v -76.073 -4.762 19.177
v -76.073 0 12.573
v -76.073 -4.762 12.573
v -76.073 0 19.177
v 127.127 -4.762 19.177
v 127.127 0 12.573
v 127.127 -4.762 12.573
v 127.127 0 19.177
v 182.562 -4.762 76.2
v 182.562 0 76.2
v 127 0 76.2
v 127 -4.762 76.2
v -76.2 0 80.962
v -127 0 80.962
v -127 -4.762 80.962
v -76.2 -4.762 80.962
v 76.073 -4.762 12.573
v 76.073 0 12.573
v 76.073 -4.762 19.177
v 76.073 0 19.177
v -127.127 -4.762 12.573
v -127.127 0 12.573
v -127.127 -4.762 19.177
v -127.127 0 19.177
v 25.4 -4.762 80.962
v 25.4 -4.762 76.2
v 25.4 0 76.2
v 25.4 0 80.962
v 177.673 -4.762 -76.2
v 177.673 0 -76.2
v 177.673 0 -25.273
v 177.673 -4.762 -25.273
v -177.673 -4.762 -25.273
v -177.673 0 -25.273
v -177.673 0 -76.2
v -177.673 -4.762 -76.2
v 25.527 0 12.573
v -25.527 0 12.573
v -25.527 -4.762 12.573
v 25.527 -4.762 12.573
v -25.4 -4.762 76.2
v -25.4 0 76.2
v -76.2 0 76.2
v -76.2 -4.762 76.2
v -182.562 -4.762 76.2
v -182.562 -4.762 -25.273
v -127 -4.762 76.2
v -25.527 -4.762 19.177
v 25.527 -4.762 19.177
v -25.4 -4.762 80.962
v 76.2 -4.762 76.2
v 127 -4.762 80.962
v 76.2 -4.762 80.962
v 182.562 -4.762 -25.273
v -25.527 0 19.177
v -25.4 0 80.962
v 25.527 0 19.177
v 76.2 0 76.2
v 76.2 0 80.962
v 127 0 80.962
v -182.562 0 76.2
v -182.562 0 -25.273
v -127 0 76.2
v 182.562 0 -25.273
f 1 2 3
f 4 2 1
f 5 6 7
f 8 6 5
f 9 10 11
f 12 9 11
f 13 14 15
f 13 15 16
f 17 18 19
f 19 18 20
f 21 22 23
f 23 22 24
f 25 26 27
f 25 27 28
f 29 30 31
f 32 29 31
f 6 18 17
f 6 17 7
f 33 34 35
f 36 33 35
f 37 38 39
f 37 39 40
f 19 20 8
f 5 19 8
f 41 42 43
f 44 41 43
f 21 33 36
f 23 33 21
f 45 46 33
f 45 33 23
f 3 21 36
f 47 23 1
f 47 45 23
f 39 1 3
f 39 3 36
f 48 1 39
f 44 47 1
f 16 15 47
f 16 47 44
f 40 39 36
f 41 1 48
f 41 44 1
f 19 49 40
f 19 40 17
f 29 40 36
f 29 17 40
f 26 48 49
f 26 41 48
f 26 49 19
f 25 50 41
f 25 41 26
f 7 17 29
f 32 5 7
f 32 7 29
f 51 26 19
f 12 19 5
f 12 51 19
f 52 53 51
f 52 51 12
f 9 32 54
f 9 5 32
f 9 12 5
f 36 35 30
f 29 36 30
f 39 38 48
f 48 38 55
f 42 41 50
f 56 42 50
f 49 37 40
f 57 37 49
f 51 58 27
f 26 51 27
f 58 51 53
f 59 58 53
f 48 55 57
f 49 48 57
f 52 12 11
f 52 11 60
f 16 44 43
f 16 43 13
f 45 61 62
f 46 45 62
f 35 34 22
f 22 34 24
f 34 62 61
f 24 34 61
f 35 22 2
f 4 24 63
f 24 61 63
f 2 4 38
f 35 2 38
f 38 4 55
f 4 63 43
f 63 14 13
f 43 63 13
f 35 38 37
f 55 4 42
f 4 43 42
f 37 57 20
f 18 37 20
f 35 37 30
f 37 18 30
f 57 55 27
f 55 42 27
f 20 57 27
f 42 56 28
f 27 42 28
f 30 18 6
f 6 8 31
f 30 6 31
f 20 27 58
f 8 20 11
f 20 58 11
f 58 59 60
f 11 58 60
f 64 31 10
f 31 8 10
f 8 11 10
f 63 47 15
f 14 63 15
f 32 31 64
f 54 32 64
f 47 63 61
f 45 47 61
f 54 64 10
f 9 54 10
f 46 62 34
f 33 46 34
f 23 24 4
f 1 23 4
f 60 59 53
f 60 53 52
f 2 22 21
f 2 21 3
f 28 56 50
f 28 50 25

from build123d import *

# Parameters (mm, degrees)
F0_W     = 51.054
F0_H     = 6.604
F0_W_2   = 50.8
F0_H_2   = 4.7625
F1_DEPTH = 4.7625


with BuildPart() as f1:
    # F0 (on Front) → F1 (new body)
    with BuildSketch(Plane.XZ):
        Polygon((-127, 76.2), (-182.5625, 76.2), (-182.5625, -25.273), (-177.673, -25.273), (-177.673, -76.2), (177.673, -76.2), (177.673, -25.273), (182.5625, -25.273), (182.5625, 76.2), (127, 76.2), (76.2, 76.2), (25.4, 76.2), (-25.4, 76.2), (-76.2, 76.2), align=None)
        with Locations((-101.6, 15.875)):
            Rectangle(F0_W, F0_H, mode=Mode.SUBTRACT)
        with Locations((0, 15.875)):
            Rectangle(F0_W, F0_H, mode=Mode.SUBTRACT)
        with Locations((101.6, 15.875)):
            Rectangle(F0_W, F0_H, mode=Mode.SUBTRACT)
        with Locations((-101.6, 78.58125)):
            Rectangle(F0_W_2, F0_H_2)
        with Locations((0, 78.58125)):
            Rectangle(F0_W_2, F0_H_2)
        with Locations((101.6, 78.58125)):
            Rectangle(F0_W_2, F0_H_2)
    extrude(amount=F1_DEPTH)


solid = f1.part
